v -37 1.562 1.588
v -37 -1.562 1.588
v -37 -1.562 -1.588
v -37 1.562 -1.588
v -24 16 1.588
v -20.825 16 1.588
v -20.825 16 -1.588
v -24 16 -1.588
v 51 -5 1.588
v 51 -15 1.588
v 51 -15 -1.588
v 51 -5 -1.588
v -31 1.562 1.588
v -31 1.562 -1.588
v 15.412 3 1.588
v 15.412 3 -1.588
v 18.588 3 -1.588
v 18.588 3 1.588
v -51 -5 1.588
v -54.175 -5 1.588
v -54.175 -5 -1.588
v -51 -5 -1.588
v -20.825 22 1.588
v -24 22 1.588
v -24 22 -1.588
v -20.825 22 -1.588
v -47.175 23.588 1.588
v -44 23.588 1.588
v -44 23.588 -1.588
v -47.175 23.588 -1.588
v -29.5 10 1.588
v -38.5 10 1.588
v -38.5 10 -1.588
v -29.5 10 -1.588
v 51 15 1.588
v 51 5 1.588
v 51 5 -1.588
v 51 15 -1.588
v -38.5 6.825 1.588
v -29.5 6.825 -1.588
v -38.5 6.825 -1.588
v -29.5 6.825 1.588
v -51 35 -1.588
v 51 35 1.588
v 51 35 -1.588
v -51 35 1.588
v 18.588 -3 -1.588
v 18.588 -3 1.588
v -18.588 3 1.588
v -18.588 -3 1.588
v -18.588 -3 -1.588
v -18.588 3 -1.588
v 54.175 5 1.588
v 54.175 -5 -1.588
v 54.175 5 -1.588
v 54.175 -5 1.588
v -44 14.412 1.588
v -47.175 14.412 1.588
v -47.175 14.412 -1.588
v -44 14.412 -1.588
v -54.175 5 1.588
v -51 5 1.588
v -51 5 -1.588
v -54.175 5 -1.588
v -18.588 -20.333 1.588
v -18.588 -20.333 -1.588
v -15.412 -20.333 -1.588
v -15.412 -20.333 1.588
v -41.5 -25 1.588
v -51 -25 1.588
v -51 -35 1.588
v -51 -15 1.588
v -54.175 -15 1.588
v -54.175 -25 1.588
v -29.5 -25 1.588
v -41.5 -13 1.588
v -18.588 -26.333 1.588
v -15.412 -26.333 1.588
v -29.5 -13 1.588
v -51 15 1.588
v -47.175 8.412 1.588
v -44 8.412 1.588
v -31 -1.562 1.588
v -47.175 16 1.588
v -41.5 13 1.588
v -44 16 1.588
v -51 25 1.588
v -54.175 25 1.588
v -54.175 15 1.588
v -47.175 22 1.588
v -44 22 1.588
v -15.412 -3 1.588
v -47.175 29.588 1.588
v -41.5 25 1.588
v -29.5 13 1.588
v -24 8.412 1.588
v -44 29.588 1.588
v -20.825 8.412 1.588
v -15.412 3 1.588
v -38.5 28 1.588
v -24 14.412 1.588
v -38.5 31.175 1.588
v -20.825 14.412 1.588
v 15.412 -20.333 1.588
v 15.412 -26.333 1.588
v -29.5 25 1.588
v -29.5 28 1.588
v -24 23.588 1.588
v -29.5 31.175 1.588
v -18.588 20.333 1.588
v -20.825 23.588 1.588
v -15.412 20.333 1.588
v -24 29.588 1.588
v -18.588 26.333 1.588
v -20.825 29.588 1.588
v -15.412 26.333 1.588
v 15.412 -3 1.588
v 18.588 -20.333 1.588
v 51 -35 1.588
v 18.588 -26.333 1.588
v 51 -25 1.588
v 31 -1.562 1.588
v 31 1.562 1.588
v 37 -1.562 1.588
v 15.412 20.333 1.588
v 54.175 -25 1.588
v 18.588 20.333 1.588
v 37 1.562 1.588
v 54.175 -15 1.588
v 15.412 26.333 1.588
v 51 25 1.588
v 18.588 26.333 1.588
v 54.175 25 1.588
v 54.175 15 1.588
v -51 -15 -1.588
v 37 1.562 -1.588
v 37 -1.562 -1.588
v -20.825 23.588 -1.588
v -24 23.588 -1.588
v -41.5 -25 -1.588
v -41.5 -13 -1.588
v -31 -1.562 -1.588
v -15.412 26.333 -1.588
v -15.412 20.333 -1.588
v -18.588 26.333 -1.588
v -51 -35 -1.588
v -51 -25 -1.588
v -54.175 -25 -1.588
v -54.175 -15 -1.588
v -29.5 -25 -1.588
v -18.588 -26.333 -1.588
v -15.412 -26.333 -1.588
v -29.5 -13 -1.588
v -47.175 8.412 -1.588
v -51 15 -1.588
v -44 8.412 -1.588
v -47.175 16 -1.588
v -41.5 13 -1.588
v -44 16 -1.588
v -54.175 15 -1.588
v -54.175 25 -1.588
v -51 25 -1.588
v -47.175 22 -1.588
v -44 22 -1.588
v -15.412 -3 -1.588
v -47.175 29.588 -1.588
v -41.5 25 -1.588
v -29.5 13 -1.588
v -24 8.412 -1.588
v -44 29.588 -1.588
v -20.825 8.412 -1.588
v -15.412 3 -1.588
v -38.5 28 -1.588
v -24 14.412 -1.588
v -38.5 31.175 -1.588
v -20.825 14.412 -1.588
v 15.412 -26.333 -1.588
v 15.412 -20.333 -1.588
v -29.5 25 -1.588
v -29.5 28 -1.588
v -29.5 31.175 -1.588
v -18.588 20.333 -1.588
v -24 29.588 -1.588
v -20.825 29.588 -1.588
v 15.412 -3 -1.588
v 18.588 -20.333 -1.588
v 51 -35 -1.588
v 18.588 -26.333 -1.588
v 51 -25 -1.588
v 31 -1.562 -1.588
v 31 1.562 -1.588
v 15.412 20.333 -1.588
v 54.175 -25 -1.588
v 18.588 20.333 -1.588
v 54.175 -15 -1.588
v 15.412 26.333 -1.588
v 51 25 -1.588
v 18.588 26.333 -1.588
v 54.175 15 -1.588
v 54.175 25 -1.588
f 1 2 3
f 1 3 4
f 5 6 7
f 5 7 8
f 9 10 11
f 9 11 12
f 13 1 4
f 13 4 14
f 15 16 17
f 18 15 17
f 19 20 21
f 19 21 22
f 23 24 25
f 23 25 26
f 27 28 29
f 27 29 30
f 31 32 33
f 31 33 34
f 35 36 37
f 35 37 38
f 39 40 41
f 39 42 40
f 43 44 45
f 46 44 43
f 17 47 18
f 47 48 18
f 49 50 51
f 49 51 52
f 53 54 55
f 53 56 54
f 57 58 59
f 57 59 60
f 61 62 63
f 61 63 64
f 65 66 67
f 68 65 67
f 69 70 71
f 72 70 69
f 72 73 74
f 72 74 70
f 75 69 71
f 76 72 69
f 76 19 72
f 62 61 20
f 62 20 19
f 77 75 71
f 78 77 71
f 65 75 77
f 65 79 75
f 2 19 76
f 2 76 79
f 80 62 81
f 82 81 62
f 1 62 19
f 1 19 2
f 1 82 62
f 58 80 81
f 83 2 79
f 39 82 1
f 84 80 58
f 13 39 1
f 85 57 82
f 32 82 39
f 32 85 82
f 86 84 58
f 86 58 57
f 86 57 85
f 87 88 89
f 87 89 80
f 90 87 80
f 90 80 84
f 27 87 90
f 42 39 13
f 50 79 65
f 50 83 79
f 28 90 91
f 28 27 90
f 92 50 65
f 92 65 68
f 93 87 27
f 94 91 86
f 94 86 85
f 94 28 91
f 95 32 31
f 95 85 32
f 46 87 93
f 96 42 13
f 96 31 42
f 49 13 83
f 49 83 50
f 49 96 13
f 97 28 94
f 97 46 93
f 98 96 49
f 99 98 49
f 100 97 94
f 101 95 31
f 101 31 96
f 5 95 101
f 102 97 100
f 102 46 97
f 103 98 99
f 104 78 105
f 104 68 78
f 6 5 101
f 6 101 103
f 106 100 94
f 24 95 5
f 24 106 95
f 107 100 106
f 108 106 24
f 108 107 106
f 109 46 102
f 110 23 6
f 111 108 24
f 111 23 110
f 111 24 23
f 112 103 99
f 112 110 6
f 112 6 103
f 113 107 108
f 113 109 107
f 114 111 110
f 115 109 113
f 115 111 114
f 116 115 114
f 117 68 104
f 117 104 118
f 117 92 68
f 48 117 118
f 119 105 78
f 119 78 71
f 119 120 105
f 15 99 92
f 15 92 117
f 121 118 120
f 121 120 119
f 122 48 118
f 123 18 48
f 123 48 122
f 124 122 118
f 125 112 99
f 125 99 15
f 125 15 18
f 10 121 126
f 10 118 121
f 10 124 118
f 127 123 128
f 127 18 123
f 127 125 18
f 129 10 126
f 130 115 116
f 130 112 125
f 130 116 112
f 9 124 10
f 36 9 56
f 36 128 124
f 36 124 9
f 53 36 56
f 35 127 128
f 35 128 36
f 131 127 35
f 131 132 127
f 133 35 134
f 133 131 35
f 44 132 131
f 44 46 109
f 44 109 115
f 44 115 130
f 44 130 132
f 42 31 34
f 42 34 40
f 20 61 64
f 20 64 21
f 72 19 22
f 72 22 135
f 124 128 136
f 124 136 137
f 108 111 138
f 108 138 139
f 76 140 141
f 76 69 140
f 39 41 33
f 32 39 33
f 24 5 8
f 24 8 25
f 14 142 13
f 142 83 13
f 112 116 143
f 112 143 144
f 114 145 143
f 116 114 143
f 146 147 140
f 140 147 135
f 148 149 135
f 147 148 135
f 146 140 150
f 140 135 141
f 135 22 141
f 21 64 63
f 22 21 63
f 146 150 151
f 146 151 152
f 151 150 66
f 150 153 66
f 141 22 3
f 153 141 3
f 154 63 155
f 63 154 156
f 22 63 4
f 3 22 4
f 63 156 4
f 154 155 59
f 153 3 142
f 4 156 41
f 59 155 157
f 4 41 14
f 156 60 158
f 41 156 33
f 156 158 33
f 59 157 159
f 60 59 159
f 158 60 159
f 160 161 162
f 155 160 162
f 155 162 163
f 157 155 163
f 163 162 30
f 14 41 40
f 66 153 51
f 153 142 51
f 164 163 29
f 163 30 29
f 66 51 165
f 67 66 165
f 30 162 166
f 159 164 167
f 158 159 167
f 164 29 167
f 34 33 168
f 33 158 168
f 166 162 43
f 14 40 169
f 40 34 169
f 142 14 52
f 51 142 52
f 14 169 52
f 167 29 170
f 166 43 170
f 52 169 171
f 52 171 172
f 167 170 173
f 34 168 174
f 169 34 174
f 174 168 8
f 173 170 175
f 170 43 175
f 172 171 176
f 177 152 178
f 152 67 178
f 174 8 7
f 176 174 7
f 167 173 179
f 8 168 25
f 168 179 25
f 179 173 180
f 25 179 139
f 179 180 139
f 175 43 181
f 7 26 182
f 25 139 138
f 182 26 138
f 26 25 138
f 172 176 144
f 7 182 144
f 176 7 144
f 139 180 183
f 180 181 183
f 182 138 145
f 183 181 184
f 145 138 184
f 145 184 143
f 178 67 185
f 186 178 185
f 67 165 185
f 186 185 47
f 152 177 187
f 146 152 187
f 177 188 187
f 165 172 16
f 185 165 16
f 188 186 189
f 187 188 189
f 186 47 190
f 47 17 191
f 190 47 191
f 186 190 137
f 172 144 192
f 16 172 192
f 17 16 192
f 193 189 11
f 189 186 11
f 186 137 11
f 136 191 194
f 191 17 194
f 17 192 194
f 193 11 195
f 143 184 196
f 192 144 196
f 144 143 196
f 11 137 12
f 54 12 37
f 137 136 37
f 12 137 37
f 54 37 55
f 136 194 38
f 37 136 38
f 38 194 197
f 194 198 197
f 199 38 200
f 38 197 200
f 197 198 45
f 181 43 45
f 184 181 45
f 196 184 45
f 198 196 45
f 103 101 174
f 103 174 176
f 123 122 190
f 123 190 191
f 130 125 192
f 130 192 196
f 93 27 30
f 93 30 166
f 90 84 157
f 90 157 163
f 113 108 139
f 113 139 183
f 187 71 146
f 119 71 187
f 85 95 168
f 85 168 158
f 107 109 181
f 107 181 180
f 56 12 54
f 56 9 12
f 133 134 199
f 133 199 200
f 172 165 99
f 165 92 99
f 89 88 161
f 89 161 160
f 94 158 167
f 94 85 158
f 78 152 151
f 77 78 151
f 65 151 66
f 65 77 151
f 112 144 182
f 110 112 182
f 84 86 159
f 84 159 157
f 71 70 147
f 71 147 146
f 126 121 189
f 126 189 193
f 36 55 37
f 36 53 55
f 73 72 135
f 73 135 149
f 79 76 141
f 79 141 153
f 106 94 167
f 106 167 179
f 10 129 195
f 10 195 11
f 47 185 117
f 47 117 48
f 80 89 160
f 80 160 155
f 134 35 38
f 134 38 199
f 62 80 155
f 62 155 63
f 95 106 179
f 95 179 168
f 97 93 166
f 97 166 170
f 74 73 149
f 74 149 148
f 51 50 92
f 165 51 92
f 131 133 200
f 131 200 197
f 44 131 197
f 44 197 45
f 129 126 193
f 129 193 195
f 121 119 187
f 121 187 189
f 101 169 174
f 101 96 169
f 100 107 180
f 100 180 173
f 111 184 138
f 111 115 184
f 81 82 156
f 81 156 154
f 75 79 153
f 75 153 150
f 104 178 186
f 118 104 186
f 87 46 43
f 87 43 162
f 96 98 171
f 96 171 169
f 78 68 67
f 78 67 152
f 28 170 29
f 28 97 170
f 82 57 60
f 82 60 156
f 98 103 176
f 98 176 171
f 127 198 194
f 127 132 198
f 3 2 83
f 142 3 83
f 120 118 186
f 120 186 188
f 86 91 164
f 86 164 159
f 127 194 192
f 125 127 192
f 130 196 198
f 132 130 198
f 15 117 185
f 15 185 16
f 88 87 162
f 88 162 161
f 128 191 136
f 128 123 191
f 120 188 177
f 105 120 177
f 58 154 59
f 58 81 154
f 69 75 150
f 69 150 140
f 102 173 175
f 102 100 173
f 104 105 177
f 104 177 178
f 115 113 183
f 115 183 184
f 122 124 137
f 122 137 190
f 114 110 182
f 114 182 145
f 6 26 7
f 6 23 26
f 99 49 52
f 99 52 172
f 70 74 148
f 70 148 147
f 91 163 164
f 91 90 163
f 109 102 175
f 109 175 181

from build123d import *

# Parameters (mm, degrees)
SKETCH1_W           = 6
SKETCH1_H           = 3.125
SKETCH1_W_2         = 3.175
SKETCH1_H_2         = 6
BOSS_EXTRUDE1_DEPTH = 1.5875


with BuildPart() as part:
    # Sketch1 → Boss-Extrude1 (new body, symmetric)
    with BuildSketch(Plane.XY):
        Polygon((54.175, 0), (54.175, 5), (51, 5), (51, 15), (54.175, 15), (54.175, 25), (51, 25), (51, 35), (17, 35), (0, 35), (-17, 35), (-51, 35), (-51, 25), (-54.175, 25), (-54.175, 15), (-51, 15), (-51, 5), (-54.175, 5), (-54.175, -5), (-51, -5), (-51, -15), (-54.175, -15), (-54.175, -25), (-51, -25), (-51, -35), (0, -35), (51, -35), (51, -25), (54.175, -25), (54.175, -15), (51, -15), (51, -5), (54.175, -5), align=None)
        Polygon((-41.5, -13), (-34, -13), (-29.5, -13), (-29.5, -25), (-34, -25), (-41.5, -25), align=None, mode=Mode.SUBTRACT)
        Polygon((-18.5875, -23.333333333), (-18.5875, -20.333333333), (-15.4125, -20.333333333), (-15.4125, -26.333333333), (-18.5875, -26.333333333), align=None, mode=Mode.SUBTRACT)
        Polygon((18.5875, -20.333333333), (18.5875, -23.333333333), (18.5875, -26.333333333), (15.4125, -26.333333333), (15.4125, -20.333333333), align=None, mode=Mode.SUBTRACT)
        with Locations((-34, 0)):
            Rectangle(SKETCH1_W, SKETCH1_H, mode=Mode.SUBTRACT)
        Polygon((-38.5, 6.825), (-38.5, 10), (-34, 10), (-29.5, 10), (-29.5, 6.825), align=None, mode=Mode.SUBTRACT)
        Polygon((-47.175, 14.4125), (-45.5875, 14.4125), (-44, 14.4125), (-44, 8.4125), (-47.175, 8.4125), align=None, mode=Mode.SUBTRACT)
        with Locations((-17, 0)):
            Rectangle(SKETCH1_W_2, SKETCH1_H_2, mode=Mode.SUBTRACT)
        Polygon((-24, 14.4125), (-22.4125, 14.4125), (-20.825, 14.4125), (-20.825, 8.4125), (-24, 8.4125), align=None, mode=Mode.SUBTRACT)
        Polygon((-44, 22), (-44, 19), (-44, 16), (-45.5875, 16), (-47.175, 16), (-47.175, 22), (-45.5875, 22), align=None, mode=Mode.SUBTRACT)
        Polygon((-41.5, 25), (-34, 25), (-29.5, 25), (-29.5, 13), (-34, 13), (-41.5, 13), align=None, mode=Mode.SUBTRACT)
        Polygon((-44, 23.5875), (-45.5875, 23.5875), (-47.175, 23.5875), (-47.175, 29.5875), (-44, 29.5875), align=None, mode=Mode.SUBTRACT)
        Polygon((-38.5, 31.175), (-29.5, 31.175), (-29.5, 28), (-34, 28), (-38.5, 28), align=None, mode=Mode.SUBTRACT)
        Polygon((-20.825, 16), (-22.4125, 16), (-24, 16), (-24, 19), (-24, 22), (-22.4125, 22), (-20.825, 22), align=None, mode=Mode.SUBTRACT)
        Polygon((-18.5875, 20.333333333), (-18.5875, 23.333333333), (-18.5875, 26.333333333), (-15.4125, 26.333333333), (-15.4125, 20.333333333), align=None, mode=Mode.SUBTRACT)
        Polygon((-20.825, 23.5875), (-22.4125, 23.5875), (-24, 23.5875), (-24, 29.5875), (-20.825, 29.5875), align=None, mode=Mode.SUBTRACT)
        with Locations((17, 0)):
            Rectangle(SKETCH1_W_2, SKETCH1_H_2, mode=Mode.SUBTRACT)
        Polygon((37, 1.5625), (37, 0), (37, -1.5625), (31, -1.5625), (31, 1.5625), align=None, mode=Mode.SUBTRACT)
        Polygon((18.5875, 23.333333333), (18.5875, 20.333333333), (15.4125, 20.333333333), (15.4125, 26.333333333), (18.5875, 26.333333333), align=None, mode=Mode.SUBTRACT)
    extrude(amount=BOSS_EXTRUDE1_DEPTH, both=True)


solid = part.part
